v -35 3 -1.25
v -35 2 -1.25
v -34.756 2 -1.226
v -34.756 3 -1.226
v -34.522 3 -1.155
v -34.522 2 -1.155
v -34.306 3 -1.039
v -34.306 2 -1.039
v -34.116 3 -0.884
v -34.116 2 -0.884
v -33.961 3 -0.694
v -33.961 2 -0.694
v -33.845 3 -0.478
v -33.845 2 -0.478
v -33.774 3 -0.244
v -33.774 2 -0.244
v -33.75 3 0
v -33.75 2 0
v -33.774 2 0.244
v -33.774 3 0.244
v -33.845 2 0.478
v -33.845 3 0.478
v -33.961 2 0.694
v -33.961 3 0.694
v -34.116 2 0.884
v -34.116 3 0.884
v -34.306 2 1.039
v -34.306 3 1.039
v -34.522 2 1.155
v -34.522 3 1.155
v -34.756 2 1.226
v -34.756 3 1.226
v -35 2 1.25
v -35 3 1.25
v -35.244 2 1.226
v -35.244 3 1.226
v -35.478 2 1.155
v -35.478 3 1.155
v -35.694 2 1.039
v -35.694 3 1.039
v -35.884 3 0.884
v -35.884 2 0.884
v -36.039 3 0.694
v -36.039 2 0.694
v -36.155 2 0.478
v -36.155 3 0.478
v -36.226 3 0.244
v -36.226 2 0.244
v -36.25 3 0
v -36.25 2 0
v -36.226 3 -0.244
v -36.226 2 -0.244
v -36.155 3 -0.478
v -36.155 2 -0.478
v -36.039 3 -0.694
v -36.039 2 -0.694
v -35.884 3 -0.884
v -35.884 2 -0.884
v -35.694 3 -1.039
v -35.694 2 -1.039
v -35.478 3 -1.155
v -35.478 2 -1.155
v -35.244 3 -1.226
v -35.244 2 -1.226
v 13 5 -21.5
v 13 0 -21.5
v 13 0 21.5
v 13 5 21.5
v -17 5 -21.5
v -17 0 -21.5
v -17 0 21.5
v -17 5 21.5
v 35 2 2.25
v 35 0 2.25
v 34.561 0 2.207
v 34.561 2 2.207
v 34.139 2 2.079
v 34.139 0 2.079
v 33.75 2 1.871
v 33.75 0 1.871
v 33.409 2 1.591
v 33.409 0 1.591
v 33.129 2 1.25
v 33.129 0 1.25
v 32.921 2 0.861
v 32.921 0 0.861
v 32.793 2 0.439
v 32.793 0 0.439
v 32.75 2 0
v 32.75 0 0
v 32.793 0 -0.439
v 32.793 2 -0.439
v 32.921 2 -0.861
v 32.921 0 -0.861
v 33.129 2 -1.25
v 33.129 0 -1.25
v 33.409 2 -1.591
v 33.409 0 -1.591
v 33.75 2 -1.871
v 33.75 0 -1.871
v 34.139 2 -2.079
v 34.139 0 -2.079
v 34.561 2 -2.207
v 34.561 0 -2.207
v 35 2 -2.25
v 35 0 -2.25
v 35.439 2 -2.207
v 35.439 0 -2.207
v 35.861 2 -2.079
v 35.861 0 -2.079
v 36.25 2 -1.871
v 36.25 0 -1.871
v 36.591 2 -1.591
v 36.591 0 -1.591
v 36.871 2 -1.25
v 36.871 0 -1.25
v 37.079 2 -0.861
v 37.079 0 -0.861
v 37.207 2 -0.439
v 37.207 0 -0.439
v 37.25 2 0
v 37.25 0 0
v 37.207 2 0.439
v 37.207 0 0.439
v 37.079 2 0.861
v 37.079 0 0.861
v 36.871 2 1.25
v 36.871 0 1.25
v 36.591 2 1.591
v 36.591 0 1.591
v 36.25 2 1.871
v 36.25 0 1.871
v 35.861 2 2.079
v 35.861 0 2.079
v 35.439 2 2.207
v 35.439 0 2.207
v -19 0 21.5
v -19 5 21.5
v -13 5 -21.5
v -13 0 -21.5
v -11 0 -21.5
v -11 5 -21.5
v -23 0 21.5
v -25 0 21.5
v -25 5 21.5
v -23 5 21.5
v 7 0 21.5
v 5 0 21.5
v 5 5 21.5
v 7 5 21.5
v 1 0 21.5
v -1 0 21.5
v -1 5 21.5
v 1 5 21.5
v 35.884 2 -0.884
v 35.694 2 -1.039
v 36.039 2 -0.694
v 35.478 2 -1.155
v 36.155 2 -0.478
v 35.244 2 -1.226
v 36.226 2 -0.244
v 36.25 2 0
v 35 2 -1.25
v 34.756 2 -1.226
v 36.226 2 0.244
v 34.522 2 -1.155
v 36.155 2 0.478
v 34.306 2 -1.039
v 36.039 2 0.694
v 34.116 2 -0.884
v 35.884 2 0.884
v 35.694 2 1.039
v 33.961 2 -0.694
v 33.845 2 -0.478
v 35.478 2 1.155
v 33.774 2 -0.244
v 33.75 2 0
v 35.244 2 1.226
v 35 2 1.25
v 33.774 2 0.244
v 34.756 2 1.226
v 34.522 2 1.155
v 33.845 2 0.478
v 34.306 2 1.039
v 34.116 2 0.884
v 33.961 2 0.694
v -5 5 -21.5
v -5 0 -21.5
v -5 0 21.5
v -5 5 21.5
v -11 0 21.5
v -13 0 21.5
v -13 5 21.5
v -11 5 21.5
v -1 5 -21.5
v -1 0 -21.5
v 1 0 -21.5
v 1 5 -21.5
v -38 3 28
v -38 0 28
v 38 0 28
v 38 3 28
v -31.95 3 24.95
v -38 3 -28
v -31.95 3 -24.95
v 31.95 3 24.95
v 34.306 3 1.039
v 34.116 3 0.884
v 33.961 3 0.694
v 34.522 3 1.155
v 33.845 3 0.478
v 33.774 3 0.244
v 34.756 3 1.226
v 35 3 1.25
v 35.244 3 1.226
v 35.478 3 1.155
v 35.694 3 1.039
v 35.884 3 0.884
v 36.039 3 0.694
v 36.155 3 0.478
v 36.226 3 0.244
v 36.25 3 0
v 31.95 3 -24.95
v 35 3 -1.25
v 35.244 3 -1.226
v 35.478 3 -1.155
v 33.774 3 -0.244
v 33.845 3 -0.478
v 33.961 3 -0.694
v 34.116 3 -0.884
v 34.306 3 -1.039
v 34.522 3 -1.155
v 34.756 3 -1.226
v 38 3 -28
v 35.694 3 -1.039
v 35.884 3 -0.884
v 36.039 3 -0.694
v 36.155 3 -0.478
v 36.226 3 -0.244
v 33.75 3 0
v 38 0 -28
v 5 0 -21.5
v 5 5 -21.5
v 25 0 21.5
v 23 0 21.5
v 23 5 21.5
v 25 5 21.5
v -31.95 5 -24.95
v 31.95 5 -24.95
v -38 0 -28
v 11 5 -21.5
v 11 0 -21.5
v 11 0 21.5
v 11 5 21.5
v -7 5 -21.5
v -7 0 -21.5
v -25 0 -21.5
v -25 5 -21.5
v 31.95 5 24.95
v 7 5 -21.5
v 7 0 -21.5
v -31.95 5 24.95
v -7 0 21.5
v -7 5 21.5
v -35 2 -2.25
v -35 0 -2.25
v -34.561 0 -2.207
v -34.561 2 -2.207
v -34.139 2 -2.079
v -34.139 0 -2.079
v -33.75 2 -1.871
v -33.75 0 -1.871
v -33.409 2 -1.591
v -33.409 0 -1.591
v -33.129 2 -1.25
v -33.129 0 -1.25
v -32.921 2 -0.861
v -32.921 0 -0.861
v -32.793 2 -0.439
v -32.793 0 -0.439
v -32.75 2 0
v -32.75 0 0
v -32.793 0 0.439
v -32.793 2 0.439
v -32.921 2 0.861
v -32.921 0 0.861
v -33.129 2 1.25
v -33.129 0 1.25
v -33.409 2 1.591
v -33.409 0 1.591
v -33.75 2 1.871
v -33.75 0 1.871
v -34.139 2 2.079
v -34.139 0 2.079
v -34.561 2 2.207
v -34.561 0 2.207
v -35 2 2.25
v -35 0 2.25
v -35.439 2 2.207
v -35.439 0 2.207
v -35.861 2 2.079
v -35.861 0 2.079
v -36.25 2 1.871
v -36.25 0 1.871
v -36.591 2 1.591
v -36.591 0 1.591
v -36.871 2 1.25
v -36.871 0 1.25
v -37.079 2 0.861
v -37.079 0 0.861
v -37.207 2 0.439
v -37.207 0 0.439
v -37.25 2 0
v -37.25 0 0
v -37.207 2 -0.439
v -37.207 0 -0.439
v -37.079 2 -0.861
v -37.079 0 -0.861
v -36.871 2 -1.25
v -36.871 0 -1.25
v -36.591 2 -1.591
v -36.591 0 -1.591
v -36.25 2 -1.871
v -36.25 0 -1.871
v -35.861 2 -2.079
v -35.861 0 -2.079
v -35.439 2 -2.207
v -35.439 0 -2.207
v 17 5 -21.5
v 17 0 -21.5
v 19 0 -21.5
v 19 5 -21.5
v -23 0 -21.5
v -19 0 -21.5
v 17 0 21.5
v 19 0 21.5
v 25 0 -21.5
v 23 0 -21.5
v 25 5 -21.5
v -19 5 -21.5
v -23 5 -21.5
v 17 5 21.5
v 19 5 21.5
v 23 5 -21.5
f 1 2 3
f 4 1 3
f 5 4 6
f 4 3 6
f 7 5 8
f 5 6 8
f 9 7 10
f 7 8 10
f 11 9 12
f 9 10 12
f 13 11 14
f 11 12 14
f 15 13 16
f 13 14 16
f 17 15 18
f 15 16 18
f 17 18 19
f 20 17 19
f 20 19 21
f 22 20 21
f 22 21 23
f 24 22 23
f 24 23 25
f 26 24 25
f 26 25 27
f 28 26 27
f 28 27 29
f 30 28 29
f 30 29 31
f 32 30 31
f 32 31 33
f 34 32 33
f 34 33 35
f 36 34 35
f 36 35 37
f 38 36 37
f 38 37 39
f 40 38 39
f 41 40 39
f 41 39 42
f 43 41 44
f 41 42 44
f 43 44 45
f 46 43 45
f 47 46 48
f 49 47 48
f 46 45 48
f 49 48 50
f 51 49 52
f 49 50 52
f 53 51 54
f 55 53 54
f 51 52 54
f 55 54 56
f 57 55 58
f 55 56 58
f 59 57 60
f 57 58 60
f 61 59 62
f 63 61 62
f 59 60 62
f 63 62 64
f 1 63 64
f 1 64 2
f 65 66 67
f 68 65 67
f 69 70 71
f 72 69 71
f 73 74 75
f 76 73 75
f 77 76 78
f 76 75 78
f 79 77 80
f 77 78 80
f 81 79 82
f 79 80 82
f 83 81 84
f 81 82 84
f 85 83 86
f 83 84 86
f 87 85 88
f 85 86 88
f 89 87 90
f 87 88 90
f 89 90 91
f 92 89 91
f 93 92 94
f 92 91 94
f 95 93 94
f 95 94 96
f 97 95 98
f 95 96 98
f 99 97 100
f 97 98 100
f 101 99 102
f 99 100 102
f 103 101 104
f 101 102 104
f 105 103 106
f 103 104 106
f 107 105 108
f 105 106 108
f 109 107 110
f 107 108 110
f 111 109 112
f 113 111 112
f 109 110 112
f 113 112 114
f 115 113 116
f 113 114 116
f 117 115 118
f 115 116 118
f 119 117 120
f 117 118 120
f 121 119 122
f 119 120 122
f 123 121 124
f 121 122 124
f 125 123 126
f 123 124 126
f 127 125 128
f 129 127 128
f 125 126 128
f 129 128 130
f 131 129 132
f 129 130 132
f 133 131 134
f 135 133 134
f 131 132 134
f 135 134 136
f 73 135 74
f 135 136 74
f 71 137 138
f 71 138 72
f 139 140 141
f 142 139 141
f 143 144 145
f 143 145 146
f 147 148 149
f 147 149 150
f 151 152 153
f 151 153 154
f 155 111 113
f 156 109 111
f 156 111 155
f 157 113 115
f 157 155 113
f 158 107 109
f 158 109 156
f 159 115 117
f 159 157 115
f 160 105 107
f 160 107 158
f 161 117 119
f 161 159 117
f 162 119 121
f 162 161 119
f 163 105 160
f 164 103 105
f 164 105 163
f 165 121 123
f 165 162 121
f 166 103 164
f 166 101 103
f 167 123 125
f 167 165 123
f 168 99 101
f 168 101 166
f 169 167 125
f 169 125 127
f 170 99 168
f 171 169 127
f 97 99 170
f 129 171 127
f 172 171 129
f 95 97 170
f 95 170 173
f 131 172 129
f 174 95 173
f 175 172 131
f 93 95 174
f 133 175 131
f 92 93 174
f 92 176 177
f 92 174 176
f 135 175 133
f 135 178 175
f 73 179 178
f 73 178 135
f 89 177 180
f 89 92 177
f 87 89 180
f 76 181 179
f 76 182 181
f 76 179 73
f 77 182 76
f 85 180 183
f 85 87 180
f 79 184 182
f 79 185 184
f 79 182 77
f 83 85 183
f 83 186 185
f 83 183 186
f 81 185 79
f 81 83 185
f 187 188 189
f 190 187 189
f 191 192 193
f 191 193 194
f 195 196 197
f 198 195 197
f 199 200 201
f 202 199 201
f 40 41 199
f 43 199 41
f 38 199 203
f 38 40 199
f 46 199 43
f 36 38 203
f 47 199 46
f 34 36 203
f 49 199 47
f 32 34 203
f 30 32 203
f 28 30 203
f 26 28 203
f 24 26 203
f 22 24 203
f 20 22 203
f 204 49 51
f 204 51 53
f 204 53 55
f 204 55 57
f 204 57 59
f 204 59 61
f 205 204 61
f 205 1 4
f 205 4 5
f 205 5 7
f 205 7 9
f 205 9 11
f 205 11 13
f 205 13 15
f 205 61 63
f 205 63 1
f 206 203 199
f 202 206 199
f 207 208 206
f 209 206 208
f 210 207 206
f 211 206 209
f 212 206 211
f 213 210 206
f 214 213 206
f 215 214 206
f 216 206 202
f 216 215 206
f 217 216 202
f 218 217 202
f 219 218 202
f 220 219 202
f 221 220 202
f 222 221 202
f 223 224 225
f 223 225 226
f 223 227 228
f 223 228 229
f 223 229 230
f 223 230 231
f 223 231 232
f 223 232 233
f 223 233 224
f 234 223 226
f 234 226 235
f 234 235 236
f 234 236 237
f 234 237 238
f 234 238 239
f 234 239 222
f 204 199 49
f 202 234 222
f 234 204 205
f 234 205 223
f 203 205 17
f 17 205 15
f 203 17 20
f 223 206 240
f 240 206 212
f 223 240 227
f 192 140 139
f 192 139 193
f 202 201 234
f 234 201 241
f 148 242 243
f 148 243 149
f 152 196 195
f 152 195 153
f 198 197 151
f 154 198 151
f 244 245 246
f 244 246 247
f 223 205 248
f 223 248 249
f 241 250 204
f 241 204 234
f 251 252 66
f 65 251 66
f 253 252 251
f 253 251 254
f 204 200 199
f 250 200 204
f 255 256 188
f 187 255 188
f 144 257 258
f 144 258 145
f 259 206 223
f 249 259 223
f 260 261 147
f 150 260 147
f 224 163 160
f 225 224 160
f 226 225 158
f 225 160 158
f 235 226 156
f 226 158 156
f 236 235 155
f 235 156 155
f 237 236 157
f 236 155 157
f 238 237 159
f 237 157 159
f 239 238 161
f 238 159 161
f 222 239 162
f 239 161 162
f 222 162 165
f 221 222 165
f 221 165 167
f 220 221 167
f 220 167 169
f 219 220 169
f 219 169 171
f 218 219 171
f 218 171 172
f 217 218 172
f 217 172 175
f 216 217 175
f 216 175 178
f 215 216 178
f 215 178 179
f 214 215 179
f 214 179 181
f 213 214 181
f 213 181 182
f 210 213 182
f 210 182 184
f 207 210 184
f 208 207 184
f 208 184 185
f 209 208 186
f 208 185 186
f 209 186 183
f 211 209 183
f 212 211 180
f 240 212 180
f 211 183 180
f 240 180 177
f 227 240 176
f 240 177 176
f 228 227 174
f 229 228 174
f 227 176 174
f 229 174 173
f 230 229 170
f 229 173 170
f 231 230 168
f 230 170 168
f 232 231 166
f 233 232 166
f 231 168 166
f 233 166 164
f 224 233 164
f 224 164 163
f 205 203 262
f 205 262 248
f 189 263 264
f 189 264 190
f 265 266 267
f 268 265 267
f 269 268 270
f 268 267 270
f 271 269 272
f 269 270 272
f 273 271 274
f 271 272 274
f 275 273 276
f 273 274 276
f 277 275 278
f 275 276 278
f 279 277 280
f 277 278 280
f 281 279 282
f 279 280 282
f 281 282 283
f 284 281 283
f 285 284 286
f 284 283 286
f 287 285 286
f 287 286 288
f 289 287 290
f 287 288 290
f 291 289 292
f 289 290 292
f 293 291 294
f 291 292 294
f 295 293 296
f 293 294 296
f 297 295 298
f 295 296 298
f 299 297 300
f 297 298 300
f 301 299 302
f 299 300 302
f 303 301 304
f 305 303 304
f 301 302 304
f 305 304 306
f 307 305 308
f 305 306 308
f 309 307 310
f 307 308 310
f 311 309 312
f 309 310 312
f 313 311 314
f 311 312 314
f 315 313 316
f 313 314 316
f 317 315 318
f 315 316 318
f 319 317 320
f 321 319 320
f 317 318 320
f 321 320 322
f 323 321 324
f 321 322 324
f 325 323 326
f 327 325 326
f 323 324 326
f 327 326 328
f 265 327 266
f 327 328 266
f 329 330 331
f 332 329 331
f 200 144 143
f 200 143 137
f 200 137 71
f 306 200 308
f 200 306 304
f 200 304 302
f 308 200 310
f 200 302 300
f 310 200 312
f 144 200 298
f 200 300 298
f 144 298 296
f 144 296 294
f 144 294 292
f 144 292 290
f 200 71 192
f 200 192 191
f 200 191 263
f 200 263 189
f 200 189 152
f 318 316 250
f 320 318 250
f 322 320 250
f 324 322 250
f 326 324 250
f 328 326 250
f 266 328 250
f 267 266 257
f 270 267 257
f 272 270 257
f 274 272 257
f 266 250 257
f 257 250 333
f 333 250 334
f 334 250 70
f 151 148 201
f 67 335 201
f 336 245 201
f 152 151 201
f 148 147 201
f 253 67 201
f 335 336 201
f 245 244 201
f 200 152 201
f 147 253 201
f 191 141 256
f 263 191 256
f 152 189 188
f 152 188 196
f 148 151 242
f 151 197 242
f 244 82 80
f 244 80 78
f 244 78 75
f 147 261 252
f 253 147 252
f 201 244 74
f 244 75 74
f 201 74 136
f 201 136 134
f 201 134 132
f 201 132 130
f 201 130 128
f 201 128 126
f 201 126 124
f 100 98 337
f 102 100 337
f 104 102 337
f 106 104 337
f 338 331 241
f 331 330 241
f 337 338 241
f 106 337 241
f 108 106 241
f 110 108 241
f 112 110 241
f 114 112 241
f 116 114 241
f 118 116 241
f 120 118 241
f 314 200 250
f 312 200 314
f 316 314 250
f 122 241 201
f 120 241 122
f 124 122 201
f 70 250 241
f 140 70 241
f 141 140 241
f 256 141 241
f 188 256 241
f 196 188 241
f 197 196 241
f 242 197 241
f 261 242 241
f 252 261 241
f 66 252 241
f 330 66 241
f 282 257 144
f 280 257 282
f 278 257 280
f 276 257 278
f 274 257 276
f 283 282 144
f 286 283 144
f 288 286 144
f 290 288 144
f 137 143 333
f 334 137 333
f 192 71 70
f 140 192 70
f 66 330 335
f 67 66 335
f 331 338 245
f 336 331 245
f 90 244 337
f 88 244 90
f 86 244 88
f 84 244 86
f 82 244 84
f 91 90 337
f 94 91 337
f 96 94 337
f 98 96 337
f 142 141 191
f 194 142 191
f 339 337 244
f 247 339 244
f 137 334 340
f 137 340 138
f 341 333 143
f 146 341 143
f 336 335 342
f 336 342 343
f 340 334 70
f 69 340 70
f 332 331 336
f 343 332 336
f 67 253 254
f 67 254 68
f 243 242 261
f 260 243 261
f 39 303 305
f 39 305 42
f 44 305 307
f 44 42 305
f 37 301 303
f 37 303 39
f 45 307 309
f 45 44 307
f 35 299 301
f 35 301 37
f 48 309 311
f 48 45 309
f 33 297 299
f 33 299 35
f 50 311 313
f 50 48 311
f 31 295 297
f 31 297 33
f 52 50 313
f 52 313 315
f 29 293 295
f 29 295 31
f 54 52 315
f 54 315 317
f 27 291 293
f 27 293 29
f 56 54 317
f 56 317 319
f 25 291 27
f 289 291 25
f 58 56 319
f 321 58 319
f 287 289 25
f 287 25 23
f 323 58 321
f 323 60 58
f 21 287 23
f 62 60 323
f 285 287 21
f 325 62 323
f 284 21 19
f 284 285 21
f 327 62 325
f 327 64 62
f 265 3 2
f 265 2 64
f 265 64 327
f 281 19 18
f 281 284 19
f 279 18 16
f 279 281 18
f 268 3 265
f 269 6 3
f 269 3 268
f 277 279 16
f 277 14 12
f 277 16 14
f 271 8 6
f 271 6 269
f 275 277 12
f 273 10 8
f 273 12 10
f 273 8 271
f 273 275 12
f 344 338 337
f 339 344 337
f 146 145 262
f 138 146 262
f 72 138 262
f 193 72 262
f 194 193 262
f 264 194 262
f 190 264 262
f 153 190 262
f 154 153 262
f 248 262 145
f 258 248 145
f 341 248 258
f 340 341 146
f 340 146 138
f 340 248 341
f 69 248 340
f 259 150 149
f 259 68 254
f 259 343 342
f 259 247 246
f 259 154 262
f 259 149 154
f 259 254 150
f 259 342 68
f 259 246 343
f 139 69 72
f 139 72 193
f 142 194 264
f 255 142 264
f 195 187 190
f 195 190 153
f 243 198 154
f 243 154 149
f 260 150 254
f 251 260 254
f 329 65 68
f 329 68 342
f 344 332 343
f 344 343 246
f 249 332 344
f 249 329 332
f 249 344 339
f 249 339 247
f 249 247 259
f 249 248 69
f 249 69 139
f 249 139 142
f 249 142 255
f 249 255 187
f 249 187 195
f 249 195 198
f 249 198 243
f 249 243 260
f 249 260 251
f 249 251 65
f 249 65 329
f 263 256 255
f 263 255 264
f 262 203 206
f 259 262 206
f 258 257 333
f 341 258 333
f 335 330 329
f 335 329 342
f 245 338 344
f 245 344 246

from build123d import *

# Parameters (mm, degrees)
SKETCH1_W           = 76
SKETCH1_H           = 56
BOSS_EXTRUDE1_DEPTH = 3
SKETCH2_W           = 63.9
SKETCH2_H           = 49.9
BOSS_EXTRUDE2_DEPTH = 2
SKETCH3_R           = 2.25
CUT_EXTRUDE1_DEPTH  = 2
CUT_EXTRUDE2_REACH  = 49.466
SKETCH4_R           = 1.25
SKETCH5_W           = 2
SKETCH5_H           = 43
CUT_EXTRUDE3_DEPTH  = 48.465777145


with BuildPart() as part:
    # Sketch1 → Boss-Extrude1 (new body)
    with BuildSketch(Plane(origin=(0, 0, 0), x_dir=(1, 0, 0), z_dir=(0, 1, 0))):
        Rectangle(SKETCH1_W, SKETCH1_H)
    extrude(amount=BOSS_EXTRUDE1_DEPTH)

    # Sketch2 → Boss-Extrude2 (add)
    with BuildSketch(Plane(origin=(0, 3, 0), x_dir=(1, 0, 0), z_dir=(0, 1, 0))):
        Rectangle(SKETCH2_W, SKETCH2_H)
    extrude(amount=BOSS_EXTRUDE2_DEPTH)

    # Sketch3 → Cut-Extrude1 (cut)
    with BuildSketch(Plane.XZ):
        with Locations(Location((-35, 0, 0), (0, 0, 270))):
            Circle(SKETCH3_R)
        with Locations(Location((35, 0, 0), (0, 0, 90))):
            Circle(SKETCH3_R)
    extrude(amount=-CUT_EXTRUDE1_DEPTH, mode=Mode.SUBTRACT)

    # Sketch4 → Cut-Extrude2 (cut, up to next)
    with BuildSketch(Plane.XZ, mode=Mode.PRIVATE) as cut_extrude2_sk1:
        with Locations(Location((-35, 0, 0), (0, 0, 270))):
            Circle(SKETCH4_R)
    cut_extrude2_tool1 = extrude(cut_extrude2_sk1.sketch, amount=-CUT_EXTRUDE2_REACH, mode=Mode.PRIVATE) & part.part
    # Sketch4 → Cut-Extrude2 (cut, up to next)
    with BuildSketch(Plane.XZ, mode=Mode.PRIVATE) as cut_extrude2_sk2:
        with Locations(Location((35, 0, 0), (0, 0, 270))):
            Circle(SKETCH4_R)
    cut_extrude2_tool2 = extrude(cut_extrude2_sk2.sketch, amount=-CUT_EXTRUDE2_REACH, mode=Mode.PRIVATE) & part.part
    add(cut_extrude2_tool1.solids().sort_by_distance((-35, 0, 0))[0], mode=Mode.SUBTRACT)
    add(cut_extrude2_tool2.solids().sort_by_distance((35, 0, 0))[0], mode=Mode.SUBTRACT)

    # Sketch5 → Cut-Extrude3 (cut, through all)
    with BuildSketch(Plane.XZ):
        with Locations((6, 0)):
            Rectangle(SKETCH5_W, SKETCH5_H)
        Rectangle(SKETCH5_W, SKETCH5_H)
        with Locations((12, 0)):
            Rectangle(SKETCH5_W, SKETCH5_H)
        with Locations((18, 0)):
            Rectangle(SKETCH5_W, SKETCH5_H)
        with Locations((24, 0)):
            Rectangle(SKETCH5_W, SKETCH5_H)
        with Locations((-6, 0)):
            Rectangle(SKETCH5_W, SKETCH5_H)
        with Locations((-12, 0)):
            Rectangle(SKETCH5_W, SKETCH5_H)
        with Locations((-18, 0)):
            Rectangle(SKETCH5_W, SKETCH5_H)
        with Locations((-24, 0)):
            Rectangle(SKETCH5_W, SKETCH5_H)
    extrude(amount=-CUT_EXTRUDE3_DEPTH, mode=Mode.SUBTRACT)


solid = part.part
